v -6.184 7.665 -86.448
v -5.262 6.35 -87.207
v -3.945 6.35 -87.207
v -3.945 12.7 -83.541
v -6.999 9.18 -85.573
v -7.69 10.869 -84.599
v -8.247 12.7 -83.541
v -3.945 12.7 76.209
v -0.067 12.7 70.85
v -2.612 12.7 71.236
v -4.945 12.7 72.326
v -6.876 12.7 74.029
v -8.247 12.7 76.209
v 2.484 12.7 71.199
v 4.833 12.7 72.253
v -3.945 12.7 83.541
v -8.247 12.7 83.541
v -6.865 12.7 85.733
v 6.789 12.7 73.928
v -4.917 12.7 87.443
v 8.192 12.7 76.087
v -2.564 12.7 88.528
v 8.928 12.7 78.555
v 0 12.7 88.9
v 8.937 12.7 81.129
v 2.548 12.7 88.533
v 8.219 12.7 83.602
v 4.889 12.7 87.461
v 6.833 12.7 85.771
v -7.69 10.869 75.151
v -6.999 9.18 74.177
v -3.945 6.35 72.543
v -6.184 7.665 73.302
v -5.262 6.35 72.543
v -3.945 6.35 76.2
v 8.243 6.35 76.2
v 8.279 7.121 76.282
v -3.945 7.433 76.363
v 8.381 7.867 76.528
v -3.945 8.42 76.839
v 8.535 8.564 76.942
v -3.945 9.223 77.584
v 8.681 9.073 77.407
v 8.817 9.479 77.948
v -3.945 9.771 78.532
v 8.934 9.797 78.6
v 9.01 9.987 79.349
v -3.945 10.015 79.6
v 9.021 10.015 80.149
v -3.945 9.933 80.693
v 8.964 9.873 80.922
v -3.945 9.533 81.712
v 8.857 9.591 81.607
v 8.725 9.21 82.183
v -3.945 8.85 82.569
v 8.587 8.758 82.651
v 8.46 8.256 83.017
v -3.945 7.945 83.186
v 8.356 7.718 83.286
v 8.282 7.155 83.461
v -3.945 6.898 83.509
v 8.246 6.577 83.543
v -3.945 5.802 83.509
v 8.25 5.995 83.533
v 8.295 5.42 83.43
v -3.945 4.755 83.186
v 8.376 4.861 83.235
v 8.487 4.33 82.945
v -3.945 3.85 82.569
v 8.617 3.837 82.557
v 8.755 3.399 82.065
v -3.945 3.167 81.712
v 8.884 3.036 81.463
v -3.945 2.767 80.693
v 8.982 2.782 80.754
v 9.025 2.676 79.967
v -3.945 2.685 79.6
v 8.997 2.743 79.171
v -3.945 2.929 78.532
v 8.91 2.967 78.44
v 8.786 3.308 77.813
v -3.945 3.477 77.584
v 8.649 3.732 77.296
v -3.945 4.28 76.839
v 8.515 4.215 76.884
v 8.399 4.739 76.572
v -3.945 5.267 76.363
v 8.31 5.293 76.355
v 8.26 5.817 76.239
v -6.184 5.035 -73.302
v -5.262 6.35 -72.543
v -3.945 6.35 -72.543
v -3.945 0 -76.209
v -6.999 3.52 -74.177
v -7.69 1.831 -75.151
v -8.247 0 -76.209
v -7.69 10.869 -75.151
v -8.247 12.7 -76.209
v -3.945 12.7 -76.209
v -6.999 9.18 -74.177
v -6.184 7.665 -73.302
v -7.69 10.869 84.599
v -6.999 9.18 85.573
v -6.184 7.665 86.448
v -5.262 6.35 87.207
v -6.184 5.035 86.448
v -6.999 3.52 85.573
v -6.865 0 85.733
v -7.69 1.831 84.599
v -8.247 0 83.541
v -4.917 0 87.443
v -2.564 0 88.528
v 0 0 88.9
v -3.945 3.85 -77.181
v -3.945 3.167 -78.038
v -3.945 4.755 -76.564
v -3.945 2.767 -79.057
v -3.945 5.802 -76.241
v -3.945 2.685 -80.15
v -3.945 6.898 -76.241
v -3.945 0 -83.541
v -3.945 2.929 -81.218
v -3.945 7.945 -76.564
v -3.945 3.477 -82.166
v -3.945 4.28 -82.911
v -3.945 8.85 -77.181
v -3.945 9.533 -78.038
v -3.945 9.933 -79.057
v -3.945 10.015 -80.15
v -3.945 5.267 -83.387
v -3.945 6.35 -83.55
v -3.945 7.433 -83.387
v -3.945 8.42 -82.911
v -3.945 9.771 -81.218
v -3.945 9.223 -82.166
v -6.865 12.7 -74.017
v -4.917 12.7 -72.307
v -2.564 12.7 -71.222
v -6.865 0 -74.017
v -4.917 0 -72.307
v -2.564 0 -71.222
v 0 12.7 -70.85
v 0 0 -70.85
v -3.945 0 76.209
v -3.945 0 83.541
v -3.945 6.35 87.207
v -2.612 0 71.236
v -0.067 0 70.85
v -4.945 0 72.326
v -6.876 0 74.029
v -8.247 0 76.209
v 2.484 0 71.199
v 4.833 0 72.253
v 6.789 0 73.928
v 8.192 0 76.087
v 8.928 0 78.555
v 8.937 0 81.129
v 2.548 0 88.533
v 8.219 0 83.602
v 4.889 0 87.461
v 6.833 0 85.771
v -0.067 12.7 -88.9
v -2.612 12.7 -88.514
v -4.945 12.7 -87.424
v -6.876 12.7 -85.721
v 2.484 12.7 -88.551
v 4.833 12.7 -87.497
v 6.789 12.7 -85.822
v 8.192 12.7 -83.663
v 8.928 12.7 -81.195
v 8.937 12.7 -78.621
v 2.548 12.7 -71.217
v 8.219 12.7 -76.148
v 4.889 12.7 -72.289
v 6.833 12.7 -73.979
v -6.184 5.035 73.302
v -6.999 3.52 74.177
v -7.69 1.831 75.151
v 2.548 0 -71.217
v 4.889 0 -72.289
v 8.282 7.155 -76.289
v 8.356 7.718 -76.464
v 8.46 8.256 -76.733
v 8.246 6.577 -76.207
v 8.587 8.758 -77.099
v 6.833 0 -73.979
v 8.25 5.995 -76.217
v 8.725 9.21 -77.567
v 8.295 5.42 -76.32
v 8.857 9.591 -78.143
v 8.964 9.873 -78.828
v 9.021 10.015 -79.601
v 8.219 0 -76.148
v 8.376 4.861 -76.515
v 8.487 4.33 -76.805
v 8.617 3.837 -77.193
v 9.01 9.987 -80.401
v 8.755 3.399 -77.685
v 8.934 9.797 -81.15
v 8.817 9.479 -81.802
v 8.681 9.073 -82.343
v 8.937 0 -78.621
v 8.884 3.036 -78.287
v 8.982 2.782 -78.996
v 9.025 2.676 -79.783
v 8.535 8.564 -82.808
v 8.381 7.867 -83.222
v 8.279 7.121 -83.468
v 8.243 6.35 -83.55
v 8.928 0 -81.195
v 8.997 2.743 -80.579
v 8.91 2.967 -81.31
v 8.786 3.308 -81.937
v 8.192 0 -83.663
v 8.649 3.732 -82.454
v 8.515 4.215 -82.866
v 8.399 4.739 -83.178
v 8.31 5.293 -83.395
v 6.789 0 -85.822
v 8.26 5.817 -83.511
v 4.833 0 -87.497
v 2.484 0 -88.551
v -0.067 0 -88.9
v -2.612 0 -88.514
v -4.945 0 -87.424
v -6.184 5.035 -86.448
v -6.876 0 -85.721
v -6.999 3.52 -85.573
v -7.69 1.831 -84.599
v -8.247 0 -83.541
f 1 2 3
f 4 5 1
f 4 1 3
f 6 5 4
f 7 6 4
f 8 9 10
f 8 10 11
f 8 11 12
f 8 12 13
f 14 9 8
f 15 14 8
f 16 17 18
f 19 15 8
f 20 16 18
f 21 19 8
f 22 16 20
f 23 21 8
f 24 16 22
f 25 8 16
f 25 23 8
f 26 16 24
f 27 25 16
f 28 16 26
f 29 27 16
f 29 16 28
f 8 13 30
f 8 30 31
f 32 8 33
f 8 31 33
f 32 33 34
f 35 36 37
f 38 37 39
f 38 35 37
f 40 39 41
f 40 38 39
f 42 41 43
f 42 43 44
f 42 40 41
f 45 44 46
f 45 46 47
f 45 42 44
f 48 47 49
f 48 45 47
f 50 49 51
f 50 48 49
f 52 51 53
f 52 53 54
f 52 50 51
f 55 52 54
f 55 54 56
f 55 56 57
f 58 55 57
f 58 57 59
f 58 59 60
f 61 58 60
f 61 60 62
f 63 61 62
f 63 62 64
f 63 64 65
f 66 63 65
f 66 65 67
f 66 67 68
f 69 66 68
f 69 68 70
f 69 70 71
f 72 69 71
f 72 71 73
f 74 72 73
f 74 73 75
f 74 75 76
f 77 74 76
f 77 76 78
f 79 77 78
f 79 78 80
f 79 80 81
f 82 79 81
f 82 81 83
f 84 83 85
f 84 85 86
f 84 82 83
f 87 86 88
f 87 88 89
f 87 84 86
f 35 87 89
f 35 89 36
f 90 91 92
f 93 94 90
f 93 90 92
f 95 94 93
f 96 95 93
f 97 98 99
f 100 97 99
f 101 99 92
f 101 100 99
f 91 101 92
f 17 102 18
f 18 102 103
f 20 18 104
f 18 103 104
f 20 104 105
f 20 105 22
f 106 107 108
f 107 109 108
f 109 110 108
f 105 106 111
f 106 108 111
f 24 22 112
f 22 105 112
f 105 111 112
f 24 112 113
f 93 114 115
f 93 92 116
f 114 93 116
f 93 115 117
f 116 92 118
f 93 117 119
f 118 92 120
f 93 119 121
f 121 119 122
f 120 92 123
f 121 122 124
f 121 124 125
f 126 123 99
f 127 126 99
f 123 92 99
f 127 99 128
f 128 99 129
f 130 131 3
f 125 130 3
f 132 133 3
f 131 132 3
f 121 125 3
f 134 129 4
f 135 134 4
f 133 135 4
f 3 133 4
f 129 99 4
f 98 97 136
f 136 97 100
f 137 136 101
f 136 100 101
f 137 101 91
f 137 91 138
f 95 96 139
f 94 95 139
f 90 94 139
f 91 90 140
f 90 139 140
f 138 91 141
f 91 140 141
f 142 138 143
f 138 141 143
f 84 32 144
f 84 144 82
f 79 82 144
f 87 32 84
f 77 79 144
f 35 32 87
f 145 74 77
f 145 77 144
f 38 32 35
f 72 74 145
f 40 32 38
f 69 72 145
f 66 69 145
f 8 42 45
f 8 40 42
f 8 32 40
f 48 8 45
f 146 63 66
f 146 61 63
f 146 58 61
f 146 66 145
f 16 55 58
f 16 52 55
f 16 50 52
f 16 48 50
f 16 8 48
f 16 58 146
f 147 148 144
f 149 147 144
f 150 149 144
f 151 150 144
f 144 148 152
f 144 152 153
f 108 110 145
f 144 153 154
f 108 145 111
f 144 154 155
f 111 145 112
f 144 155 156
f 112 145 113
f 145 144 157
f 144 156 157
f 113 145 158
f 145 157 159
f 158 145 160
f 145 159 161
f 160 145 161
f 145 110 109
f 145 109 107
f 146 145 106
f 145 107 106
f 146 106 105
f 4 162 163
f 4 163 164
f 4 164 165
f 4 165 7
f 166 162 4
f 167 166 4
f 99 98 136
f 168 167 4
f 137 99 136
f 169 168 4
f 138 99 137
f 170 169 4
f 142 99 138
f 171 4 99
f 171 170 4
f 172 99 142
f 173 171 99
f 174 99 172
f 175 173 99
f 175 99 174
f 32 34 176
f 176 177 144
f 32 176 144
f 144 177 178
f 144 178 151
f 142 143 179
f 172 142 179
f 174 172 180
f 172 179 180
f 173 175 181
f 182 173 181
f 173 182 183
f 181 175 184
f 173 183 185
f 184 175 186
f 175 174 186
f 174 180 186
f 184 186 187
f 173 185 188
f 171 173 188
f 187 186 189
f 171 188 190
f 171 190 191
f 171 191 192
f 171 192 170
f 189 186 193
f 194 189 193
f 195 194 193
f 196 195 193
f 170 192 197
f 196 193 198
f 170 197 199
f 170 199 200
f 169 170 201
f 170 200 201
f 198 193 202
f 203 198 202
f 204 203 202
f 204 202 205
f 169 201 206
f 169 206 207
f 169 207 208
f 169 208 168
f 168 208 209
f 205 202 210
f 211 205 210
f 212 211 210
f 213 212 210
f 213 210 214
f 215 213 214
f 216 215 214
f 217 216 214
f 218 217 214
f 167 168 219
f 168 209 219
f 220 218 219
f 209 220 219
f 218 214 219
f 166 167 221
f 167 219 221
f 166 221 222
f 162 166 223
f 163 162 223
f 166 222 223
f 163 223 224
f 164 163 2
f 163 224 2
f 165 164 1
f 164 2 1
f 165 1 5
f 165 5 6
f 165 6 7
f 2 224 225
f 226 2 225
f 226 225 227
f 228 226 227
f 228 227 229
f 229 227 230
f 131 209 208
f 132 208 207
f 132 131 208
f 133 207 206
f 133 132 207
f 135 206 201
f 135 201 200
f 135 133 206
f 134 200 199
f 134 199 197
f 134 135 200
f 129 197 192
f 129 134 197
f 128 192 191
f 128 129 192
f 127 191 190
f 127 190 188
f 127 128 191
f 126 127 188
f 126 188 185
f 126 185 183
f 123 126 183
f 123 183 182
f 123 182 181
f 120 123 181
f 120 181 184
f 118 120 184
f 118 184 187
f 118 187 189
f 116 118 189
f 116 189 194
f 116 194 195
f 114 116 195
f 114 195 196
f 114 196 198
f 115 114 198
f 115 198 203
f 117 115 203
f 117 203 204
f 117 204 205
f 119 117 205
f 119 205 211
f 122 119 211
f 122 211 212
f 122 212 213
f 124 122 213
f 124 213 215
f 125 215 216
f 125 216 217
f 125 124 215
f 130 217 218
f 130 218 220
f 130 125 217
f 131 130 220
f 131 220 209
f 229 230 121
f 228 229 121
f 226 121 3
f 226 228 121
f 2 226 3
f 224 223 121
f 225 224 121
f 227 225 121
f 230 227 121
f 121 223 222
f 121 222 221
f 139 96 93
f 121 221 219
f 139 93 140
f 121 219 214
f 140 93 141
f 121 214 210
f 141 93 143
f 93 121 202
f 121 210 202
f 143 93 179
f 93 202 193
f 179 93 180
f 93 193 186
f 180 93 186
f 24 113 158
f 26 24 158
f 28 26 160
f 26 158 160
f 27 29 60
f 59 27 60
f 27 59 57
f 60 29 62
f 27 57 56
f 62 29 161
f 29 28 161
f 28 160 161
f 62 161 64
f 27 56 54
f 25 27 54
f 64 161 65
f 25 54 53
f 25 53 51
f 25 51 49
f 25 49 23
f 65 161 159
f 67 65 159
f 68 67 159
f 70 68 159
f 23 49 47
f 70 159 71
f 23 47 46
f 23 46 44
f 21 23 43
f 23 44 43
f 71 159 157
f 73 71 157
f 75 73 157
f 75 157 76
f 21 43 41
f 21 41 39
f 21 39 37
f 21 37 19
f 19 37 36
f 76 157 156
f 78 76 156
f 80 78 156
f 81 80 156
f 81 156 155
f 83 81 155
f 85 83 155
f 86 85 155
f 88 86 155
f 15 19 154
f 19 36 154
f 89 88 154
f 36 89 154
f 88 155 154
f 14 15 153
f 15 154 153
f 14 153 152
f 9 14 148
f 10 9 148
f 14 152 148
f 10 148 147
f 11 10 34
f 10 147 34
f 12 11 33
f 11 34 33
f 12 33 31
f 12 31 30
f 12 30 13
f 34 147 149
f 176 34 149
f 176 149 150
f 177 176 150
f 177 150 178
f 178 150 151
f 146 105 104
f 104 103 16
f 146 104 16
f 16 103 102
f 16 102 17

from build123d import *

# Parameters (mm, degrees)
SKETCH1_R               = 9.025
BOSS_EXTRUDE1_DEPTH     = 12.7
BOSS_EXTRUDE1_2_DEPTH   = 12.7
CUT_EXTRUDE1_DEPTH      = 91.254920226
CUT_EXTRUDE1_DEPTH_BACK = 91.254920226
SKETCH2_R               = 3.675
CUT_EXTRUDE2_DEPTH      = 5.08


with BuildPart() as part:
    # Sketch1 → Boss-Extrude1 (new body)
    with BuildSketch(Plane(origin=(0, 0, 0), x_dir=(1, 0, 0), z_dir=(0, 1, 0))):
        with Locations(Location((0, 79.875, 0), (0, 0, 270))):
            Circle(SKETCH1_R)
    extrude(amount=BOSS_EXTRUDE1_DEPTH)


with BuildPart() as body_2:
    # Sketch1 → Boss-Extrude1 2 (new body)
    with BuildSketch(Plane(origin=(0, 0, 0), x_dir=(1, 0, 0), z_dir=(0, 1, 0))):
        with Locations(Location((0, -79.875, 0), (0, 0, 270))):
            Circle(SKETCH1_R)
    extrude(amount=BOSS_EXTRUDE1_2_DEPTH)


with BuildPart() as cut_extrude1_tool:
    # Sketch2 → Cut-Extrude1 (new, two sides: drawn at the far end of the back side and taken through both)
    with BuildSketch(Plane(origin=(0, 0, 0), x_dir=(0, 0, -1), z_dir=(1, 0, 0)).offset(-CUT_EXTRUDE1_DEPTH_BACK)):
        with Locations((-79.875, 6.35)):
            Circle(SKETCH2_R)
        with Locations((79.875, 6.35)):
            Circle(SKETCH2_R)
    extrude(amount=CUT_EXTRUDE1_DEPTH + CUT_EXTRUDE1_DEPTH_BACK)


with BuildPart() as part_1:
    add(part.part)

    # Cut-Extrude1: cut by cut_extrude1_tool
    add(cut_extrude1_tool.part, mode=Mode.SUBTRACT)


with BuildPart() as body_2_1:
    add(body_2.part)

    # Cut-Extrude1: cut by cut_extrude1_tool
    add(cut_extrude1_tool.part, mode=Mode.SUBTRACT)


with BuildPart() as cut_extrude2_tool:
    # Sketch3 → Cut-Extrude2 (new body)
    with BuildSketch(Plane.ZY.offset(9.025)):
        Polygon((83.541174209, 0), (87.207348419, 6.35), (83.541174209, 12.7), (76.208825791, 12.7), (72.542651581, 6.35), (76.208825791, 0), align=None)
        Polygon((-76.208825791, 0), (-83.541174209, 0), (-87.207348419, 6.35), (-83.541174209, 12.7), (-76.208825791, 12.7), (-72.542651581, 6.35), align=None)
    extrude(amount=-CUT_EXTRUDE2_DEPTH)


with BuildPart() as part_2:
    add(part_1.part)

    # Cut-Extrude2: cut by cut_extrude2_tool
    add(cut_extrude2_tool.part, mode=Mode.SUBTRACT)


with BuildPart() as body_2_2:
    add(body_2_1.part)

    # Cut-Extrude2: cut by cut_extrude2_tool
    add(cut_extrude2_tool.part, mode=Mode.SUBTRACT)


solid = Compound([part_2.part, body_2_2.part])
